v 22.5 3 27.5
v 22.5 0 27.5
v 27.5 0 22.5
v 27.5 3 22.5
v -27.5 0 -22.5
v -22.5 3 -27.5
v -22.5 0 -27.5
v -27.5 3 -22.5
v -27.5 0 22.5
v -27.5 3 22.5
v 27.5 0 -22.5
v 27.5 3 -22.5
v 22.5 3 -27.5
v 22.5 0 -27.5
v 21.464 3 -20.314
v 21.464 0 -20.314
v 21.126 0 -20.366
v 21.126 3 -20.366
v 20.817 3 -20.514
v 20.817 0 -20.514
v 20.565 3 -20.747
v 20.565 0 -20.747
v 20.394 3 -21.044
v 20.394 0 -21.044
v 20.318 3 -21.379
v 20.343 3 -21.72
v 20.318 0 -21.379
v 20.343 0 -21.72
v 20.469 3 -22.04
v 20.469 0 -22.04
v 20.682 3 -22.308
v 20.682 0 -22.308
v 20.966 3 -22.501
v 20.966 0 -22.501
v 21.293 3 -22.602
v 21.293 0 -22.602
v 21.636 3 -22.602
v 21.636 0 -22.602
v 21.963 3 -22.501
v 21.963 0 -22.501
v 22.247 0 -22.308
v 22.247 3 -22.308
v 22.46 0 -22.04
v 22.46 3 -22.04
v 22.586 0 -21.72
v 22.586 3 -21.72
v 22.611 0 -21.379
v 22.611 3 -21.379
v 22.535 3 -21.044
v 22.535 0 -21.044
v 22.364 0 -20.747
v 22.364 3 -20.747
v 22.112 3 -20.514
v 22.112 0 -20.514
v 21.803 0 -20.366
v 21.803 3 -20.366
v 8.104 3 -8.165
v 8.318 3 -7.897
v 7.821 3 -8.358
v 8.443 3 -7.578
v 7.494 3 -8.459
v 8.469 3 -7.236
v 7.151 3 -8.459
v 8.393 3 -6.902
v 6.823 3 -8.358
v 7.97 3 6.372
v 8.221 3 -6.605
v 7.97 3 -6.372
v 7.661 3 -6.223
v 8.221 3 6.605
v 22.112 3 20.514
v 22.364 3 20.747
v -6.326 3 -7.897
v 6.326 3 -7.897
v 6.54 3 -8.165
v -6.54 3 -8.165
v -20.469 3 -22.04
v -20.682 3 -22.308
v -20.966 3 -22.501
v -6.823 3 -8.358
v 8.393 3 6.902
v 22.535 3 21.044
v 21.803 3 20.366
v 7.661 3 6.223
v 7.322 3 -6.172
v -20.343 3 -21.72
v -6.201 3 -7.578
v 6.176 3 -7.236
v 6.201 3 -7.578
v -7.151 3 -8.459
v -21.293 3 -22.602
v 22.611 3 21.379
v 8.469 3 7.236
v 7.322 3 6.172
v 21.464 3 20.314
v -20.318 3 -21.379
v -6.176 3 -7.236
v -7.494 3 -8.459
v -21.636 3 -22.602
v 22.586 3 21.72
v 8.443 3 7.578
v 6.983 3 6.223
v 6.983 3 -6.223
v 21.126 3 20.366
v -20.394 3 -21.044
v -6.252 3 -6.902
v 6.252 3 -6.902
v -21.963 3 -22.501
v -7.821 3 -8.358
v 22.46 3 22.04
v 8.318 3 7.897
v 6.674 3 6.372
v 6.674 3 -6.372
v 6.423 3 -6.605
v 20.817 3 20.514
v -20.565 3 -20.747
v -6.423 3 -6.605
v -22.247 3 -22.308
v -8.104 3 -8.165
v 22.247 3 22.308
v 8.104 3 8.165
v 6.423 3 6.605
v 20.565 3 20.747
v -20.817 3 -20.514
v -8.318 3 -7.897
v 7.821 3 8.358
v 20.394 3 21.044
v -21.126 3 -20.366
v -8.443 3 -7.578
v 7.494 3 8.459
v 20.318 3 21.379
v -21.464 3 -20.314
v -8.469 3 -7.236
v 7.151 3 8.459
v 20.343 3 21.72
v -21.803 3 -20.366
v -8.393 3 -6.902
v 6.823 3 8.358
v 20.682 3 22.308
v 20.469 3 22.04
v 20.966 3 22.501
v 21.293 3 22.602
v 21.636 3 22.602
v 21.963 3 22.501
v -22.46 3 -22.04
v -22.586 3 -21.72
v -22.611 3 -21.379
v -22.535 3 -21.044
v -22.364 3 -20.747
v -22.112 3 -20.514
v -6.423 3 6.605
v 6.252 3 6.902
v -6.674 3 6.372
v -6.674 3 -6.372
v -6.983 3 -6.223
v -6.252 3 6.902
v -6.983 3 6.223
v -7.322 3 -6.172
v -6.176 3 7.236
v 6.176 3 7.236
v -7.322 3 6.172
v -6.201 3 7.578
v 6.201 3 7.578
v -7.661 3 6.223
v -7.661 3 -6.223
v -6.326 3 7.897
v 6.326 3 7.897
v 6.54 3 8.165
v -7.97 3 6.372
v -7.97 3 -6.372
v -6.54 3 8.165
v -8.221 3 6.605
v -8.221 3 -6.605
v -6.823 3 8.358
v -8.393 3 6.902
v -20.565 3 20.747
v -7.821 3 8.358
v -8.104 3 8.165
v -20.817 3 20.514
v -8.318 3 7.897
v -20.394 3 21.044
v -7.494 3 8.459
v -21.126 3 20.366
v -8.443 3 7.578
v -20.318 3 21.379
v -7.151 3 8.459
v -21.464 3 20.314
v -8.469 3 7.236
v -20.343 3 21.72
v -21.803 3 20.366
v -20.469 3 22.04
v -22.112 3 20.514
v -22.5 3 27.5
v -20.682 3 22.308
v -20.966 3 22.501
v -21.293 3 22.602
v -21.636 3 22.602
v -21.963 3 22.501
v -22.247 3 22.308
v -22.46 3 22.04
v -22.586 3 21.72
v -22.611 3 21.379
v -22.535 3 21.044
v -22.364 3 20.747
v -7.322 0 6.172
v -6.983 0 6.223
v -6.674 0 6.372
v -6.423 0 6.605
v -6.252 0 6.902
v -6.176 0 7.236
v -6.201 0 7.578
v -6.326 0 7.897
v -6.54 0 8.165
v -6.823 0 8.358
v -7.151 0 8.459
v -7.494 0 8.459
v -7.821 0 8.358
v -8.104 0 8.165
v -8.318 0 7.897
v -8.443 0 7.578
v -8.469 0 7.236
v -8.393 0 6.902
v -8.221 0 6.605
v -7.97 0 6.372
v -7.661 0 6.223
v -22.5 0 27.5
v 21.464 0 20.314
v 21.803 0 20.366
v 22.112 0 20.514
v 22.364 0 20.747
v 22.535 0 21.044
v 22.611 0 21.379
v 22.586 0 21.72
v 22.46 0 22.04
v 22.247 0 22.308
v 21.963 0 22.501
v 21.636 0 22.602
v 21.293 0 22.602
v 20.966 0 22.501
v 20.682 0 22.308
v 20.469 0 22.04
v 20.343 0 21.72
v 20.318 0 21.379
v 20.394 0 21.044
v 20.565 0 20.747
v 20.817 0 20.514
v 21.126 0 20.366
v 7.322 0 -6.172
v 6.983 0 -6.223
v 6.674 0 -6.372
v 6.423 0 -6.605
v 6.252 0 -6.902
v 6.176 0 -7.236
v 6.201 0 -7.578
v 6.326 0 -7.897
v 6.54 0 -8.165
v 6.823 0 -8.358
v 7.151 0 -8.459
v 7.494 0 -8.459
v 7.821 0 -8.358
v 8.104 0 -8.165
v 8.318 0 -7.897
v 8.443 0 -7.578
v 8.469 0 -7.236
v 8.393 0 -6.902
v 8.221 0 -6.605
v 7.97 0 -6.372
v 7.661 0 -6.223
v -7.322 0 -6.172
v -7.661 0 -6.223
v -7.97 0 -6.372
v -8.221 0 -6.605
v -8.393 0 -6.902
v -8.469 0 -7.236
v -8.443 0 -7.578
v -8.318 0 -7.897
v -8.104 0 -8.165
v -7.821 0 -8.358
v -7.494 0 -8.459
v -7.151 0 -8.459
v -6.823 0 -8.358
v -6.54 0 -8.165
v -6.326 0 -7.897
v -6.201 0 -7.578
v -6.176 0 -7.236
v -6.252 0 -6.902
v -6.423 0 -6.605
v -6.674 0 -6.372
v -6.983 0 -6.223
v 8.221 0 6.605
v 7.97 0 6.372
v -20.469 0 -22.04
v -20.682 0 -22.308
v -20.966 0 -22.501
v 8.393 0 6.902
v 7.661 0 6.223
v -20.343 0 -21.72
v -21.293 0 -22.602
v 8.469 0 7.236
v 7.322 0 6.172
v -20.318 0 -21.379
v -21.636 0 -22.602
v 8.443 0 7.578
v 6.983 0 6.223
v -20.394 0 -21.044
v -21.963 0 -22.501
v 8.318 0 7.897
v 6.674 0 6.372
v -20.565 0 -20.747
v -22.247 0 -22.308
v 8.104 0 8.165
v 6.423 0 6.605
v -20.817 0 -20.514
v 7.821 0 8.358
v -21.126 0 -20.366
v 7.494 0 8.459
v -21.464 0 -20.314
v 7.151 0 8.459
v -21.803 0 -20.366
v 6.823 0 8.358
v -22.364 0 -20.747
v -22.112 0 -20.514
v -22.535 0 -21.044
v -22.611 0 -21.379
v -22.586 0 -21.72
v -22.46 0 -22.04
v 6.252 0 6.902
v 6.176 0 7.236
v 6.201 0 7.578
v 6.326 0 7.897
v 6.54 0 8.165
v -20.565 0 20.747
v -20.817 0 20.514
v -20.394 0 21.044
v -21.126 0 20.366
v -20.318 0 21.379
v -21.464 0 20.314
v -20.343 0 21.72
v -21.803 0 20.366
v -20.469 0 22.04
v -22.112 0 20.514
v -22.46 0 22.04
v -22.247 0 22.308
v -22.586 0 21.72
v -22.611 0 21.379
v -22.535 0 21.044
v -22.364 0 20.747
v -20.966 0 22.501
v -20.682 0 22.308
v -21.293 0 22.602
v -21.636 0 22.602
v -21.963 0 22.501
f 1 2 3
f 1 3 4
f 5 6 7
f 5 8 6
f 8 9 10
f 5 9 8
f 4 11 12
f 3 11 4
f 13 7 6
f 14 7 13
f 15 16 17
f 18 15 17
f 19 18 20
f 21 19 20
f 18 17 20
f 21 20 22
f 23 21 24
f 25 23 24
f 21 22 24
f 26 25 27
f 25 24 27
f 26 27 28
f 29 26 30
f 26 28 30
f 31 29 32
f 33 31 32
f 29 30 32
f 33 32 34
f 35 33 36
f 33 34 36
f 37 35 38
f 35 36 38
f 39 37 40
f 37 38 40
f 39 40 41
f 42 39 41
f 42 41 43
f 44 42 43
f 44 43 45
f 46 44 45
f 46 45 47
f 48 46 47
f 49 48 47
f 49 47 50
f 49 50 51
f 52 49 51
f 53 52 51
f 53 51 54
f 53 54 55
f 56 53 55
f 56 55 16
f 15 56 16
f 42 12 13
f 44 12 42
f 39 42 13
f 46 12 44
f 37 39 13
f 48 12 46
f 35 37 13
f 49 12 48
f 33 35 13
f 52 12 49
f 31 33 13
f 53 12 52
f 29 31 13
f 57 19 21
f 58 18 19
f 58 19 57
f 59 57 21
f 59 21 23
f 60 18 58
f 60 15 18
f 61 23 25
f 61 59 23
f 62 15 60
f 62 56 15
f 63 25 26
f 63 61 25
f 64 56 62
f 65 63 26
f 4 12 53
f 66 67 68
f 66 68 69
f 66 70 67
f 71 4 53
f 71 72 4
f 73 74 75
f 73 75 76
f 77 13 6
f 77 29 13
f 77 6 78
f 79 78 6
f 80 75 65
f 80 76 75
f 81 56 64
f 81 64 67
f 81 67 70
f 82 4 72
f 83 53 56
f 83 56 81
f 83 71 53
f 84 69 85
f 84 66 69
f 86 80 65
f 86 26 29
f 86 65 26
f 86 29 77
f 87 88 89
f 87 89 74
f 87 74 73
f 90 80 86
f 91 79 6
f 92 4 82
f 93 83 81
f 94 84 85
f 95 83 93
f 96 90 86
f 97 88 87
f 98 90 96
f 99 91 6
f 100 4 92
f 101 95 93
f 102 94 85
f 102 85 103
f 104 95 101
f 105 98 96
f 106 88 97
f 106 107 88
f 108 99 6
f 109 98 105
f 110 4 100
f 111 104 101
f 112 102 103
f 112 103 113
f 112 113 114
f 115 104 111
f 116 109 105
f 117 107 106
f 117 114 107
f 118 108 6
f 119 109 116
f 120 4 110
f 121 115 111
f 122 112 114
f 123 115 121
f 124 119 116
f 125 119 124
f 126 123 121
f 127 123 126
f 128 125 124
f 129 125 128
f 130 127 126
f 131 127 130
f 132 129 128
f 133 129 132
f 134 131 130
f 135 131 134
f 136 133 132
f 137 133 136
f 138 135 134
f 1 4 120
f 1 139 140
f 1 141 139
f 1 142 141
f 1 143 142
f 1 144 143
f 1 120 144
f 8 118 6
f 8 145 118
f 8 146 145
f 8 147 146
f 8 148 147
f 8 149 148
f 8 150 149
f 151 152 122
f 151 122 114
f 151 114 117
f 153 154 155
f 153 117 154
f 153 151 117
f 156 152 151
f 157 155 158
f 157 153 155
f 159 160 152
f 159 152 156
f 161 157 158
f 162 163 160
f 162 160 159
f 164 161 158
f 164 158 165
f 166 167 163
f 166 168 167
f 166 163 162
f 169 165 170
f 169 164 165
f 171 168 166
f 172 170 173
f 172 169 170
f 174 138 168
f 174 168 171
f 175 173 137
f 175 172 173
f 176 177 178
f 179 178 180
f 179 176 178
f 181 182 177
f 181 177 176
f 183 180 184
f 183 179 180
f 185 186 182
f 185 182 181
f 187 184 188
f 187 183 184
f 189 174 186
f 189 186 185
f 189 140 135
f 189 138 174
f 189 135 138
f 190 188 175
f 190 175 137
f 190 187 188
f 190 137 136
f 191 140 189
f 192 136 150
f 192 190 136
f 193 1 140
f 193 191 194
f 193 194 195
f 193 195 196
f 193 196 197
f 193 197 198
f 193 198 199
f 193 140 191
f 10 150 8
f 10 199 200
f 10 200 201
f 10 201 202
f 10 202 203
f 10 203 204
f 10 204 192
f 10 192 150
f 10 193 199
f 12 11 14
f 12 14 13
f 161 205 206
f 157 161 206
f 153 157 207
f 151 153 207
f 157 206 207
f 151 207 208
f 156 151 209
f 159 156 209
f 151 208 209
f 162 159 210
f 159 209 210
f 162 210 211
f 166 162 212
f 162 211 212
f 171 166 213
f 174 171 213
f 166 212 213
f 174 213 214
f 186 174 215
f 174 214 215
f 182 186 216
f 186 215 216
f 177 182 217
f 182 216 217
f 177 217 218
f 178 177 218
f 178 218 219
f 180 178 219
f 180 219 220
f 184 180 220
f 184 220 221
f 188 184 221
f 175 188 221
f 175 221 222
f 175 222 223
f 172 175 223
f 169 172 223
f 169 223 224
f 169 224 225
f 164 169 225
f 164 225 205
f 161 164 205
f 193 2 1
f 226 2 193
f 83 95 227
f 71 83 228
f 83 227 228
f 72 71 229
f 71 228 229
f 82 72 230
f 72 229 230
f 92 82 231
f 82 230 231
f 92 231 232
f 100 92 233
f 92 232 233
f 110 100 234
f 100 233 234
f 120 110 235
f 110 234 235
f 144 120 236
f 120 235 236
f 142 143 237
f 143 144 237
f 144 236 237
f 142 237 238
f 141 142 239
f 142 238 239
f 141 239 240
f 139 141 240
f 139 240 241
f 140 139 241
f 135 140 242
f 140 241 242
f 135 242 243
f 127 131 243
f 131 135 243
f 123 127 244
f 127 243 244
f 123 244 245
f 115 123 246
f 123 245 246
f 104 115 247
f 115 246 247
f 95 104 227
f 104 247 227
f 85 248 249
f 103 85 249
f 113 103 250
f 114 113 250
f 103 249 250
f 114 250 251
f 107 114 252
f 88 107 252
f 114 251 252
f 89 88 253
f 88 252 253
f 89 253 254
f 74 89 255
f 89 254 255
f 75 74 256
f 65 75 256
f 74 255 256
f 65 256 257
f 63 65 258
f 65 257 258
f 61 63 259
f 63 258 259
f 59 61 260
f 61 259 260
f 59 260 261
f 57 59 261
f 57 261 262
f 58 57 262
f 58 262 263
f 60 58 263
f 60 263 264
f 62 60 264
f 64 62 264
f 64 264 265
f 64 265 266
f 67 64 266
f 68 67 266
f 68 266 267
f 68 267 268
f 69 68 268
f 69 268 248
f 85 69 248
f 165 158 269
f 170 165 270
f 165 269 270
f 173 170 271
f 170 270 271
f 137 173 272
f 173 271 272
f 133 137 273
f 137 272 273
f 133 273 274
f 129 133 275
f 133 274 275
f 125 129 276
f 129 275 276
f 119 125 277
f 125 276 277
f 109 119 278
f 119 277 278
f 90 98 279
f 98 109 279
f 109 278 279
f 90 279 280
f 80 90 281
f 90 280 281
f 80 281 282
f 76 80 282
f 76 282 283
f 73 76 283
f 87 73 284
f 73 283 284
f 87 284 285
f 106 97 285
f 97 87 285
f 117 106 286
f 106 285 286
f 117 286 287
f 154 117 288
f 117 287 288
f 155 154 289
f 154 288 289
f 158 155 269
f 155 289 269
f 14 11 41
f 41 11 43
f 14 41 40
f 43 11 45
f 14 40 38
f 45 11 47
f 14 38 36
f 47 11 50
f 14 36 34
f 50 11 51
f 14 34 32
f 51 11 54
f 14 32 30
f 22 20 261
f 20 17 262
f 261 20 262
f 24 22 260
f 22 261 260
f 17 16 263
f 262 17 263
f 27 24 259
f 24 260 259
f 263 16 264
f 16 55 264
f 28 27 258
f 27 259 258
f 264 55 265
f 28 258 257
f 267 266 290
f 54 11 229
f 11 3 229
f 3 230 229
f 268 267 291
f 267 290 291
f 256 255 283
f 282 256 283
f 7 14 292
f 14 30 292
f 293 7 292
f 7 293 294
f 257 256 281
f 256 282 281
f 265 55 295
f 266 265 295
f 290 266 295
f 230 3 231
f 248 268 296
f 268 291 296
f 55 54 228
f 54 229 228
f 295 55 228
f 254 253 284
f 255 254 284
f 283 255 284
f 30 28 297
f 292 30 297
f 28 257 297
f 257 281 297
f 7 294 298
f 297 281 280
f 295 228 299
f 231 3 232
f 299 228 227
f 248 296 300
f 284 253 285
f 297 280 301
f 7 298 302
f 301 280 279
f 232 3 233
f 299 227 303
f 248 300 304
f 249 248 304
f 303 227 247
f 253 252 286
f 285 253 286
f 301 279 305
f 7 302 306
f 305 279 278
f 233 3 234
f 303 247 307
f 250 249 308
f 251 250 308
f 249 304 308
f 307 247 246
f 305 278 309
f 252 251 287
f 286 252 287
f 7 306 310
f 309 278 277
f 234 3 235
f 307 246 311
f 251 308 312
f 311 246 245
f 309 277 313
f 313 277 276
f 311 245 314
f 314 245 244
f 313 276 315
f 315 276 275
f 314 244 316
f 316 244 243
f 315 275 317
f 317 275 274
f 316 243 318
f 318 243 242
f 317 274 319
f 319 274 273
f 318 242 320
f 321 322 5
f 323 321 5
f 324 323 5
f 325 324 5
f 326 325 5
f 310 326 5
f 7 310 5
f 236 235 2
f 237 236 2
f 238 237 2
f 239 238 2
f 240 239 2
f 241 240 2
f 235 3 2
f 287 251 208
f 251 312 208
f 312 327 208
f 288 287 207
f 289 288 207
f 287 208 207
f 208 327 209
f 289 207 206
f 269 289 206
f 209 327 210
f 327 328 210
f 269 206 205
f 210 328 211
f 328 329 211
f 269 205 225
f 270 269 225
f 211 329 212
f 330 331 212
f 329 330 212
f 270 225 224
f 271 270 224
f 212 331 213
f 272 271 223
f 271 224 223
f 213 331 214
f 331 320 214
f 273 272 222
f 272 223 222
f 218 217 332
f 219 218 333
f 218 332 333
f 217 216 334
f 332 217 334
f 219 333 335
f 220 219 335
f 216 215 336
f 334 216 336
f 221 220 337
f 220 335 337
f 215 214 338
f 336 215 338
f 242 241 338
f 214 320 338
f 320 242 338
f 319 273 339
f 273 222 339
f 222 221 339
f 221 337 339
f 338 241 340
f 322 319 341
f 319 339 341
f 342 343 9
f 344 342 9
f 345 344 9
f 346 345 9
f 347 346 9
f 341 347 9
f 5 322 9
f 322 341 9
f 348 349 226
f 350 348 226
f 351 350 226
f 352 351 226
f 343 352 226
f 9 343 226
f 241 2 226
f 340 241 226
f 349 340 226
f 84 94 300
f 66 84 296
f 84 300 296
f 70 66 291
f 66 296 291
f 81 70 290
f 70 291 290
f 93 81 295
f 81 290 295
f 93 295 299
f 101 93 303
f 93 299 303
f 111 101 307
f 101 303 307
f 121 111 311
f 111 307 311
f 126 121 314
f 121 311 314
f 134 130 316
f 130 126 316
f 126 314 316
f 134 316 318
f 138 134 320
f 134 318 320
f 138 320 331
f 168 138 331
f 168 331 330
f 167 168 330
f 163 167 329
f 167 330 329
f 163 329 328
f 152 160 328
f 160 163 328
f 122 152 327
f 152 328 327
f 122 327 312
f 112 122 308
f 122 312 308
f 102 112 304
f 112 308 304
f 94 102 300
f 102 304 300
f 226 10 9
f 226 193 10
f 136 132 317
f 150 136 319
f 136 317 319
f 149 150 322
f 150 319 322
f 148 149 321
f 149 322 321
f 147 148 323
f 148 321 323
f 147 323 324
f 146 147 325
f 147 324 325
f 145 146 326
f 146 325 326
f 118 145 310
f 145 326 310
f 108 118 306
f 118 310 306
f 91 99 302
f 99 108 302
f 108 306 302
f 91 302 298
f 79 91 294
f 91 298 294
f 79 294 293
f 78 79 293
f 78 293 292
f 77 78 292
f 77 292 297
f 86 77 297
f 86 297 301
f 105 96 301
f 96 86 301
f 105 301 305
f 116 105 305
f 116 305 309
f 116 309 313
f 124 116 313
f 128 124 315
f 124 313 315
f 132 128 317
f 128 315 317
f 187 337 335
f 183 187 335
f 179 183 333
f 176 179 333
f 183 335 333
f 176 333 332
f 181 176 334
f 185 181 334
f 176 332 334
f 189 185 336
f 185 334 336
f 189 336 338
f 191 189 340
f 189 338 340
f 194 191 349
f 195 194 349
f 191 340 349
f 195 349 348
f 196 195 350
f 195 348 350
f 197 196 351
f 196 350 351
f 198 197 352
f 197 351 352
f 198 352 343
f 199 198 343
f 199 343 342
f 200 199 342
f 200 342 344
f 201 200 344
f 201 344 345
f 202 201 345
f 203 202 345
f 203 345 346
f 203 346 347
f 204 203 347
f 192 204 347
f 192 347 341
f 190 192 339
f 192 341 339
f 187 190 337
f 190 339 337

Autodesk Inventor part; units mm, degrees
ref_plane "YZ Plane" through (0, 0, 0) normal (1, 0, 0) x (0, 1, 0)
ref_plane "XZ Plane" through (0, 0, 0) normal (0, 1, 0) x (-1, 0, 0)
ref_plane "XY Plane" through (0, 0, 0) normal (0, 0, 1) x (1, 0, 0)
sketch "Sketch1" plane through (0, 0, 0) normal (0, 1, 0) x (-1, 0, 0)
  line L0 (27.5, -27.5) -> (-27.5, -27.5)
  line L1 (-27.5, -27.5) -> (-27.5, 27.5)
  line L2 (-27.5, 27.5) -> (27.5, 27.5)
  line L3 (27.5, 27.5) -> (27.5, -27.5)
  line L4 (27.5, 0) -> (-27.5, 0)
  line L5 (0, -27.5) -> (0, 27.5)
  point P0 (0, 0)
  dimension "d3" = 55
  dimension "d4" = 55
extrude "Extrusion1" add sketch "Sketch1" along normal blind 3
chamfer "Chamfer1" distance 5 angle 45 4 edges at (-27.5, 1.5, 27.5) (27.5, 1.5, 27.5) (27.5, 1.5, -27.5) (-27.5, 1.5, -27.5)
sketch "Sketch3" plane through (0, 3, 0) normal (0, 1, 0) x (1, 0, 0)
  line L0 (22.5, 27.5) -> (27.5, 22.5) projected
  line L1 (25, 25) -> (-25, -25)
  line L2 (-22.5, -27.5) -> (-27.5, -22.5) projected
  point P0 (0, 0)
  point P1 (7.3223, 7.3223)
  point P2 (21.4645, 21.4645)
  dimension "d12" = 20
  dimension "d13" = 5
hole "Hole1" at (7.3223, 3, -7.3223) at (21.4645, 3, -21.4645) direction (0, -1, 0) diameter 2.3 end through all
mirror "Mirror1" about plane through (0, 0, 0) normal (0, 0, 1) of "Hole1"
mirror "Mirror2" about plane through (0, 0, 0) normal (1, 0, 0) of "Hole1", "Mirror1"
properties part number "Top Plate"
